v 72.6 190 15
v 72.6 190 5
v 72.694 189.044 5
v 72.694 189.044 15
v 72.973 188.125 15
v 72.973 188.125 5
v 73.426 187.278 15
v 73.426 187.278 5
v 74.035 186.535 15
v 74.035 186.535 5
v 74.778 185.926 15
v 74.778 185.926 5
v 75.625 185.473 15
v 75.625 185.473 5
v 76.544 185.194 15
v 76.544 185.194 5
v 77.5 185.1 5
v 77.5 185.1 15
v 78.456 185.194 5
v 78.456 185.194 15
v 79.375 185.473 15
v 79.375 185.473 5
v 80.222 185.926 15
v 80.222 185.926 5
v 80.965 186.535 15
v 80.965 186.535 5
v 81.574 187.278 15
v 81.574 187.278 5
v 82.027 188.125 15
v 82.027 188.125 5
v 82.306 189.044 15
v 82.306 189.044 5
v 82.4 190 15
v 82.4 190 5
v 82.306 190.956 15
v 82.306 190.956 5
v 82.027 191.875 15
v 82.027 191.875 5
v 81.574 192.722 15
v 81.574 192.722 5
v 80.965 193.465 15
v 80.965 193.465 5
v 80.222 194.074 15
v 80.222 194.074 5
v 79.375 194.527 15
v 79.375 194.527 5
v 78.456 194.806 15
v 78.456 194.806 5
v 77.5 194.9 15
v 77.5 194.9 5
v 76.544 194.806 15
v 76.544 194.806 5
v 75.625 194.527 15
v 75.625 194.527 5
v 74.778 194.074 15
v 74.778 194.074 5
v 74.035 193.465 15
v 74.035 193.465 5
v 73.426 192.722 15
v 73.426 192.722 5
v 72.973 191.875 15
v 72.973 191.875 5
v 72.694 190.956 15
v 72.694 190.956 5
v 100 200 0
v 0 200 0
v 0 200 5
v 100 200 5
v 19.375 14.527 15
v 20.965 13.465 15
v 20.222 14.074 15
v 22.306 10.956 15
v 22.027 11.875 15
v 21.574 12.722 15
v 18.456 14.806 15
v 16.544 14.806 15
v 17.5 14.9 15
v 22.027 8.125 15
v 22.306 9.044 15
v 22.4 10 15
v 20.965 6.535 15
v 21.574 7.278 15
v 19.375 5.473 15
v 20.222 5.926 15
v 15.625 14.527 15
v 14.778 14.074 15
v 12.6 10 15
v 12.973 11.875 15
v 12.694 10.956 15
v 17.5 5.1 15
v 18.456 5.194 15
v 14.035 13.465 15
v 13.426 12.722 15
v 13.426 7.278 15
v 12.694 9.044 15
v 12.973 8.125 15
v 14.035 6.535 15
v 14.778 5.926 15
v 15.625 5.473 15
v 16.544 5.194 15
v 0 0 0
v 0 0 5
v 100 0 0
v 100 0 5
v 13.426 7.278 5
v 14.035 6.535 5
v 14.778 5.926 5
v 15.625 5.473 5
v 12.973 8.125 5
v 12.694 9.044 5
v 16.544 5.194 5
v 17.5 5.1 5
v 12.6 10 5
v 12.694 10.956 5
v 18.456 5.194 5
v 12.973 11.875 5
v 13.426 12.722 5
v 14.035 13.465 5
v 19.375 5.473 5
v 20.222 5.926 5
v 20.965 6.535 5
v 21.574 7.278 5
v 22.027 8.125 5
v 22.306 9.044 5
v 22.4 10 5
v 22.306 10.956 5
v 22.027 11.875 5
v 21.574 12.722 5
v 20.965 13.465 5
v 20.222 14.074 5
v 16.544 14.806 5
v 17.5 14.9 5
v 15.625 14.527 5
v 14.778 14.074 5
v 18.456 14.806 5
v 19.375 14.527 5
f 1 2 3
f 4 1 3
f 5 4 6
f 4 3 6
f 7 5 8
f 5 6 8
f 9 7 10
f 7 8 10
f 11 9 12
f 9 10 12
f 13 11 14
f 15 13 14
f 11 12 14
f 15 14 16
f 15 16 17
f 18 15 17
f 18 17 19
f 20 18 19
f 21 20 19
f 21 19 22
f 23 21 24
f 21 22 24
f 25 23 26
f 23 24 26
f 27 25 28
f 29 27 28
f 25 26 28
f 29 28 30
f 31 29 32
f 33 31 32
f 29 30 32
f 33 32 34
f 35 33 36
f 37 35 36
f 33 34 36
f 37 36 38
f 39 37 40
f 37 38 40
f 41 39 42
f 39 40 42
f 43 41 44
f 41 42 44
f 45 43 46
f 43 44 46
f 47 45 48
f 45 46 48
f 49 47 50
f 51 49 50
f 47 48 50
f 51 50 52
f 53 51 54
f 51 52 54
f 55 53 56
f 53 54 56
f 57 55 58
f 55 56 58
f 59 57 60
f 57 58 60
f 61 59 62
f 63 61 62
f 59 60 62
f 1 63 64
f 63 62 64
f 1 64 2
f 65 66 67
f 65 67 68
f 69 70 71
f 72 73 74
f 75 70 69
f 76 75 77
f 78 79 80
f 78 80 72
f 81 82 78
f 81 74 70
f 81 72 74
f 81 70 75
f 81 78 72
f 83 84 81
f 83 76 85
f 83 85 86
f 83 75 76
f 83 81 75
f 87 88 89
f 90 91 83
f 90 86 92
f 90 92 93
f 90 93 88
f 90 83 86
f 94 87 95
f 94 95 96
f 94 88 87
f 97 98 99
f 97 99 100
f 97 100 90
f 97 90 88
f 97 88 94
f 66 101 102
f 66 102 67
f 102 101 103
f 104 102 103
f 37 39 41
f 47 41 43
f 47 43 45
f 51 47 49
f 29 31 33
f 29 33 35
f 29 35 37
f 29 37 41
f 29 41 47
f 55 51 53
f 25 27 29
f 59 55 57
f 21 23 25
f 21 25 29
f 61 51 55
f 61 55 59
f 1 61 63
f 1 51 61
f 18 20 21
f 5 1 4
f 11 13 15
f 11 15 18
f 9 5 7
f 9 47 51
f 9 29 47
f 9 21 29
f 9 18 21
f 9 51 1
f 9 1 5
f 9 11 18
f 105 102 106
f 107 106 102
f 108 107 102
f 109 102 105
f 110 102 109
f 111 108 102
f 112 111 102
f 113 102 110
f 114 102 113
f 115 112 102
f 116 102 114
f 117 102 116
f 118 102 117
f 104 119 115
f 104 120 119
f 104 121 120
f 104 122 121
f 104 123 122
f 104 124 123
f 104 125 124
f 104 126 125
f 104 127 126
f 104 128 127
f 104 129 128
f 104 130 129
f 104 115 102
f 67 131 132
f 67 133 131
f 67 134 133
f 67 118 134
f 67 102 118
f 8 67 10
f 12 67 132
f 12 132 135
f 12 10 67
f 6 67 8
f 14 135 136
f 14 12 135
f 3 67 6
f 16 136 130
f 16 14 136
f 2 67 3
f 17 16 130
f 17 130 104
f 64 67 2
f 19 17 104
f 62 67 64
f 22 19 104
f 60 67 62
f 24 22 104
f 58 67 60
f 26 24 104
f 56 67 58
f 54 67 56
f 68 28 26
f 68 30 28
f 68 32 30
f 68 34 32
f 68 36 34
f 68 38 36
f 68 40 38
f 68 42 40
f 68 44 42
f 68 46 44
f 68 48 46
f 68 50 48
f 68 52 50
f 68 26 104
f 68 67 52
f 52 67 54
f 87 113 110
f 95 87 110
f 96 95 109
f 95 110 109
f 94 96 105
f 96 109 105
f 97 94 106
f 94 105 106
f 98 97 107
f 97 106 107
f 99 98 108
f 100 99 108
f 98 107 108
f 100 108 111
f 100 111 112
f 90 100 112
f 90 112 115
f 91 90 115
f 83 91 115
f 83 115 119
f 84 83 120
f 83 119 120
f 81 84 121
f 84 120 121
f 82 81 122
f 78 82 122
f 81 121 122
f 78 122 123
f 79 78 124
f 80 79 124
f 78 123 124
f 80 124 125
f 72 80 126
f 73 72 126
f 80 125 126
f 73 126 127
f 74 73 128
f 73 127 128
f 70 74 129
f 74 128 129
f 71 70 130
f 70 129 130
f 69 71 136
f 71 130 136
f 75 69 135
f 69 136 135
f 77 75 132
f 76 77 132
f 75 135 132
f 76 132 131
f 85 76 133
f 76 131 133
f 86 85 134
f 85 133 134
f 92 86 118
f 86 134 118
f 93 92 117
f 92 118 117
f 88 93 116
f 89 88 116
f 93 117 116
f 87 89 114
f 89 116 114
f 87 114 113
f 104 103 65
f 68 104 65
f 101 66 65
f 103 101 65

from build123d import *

# Parameters (mm, degrees)
SKETCH1_W           = 100
SKETCH1_H           = 200
BOSS_EXTRUDE1_DEPTH = 5
SKETCH2_R           = 4.9
BOSS_EXTRUDE2_DEPTH = 10


with BuildPart() as part:
    # Sketch1 → Boss-Extrude1 (new body)
    with BuildSketch(Plane.XY):
        with Locations((50, 100)):
            Rectangle(SKETCH1_W, SKETCH1_H)
    extrude(amount=BOSS_EXTRUDE1_DEPTH)

    # Sketch2 → Boss-Extrude2 (add)
    with BuildSketch(Plane.XY.offset(5)):
        with Locations(Location((17.5, 10, 0), (0, 0, 180))):
            Circle(SKETCH2_R)
        with Locations(Location((77.5, 190, 0), (0, 0, 180))):
            Circle(SKETCH2_R)
    extrude(amount=BOSS_EXTRUDE2_DEPTH)


solid = part.part
